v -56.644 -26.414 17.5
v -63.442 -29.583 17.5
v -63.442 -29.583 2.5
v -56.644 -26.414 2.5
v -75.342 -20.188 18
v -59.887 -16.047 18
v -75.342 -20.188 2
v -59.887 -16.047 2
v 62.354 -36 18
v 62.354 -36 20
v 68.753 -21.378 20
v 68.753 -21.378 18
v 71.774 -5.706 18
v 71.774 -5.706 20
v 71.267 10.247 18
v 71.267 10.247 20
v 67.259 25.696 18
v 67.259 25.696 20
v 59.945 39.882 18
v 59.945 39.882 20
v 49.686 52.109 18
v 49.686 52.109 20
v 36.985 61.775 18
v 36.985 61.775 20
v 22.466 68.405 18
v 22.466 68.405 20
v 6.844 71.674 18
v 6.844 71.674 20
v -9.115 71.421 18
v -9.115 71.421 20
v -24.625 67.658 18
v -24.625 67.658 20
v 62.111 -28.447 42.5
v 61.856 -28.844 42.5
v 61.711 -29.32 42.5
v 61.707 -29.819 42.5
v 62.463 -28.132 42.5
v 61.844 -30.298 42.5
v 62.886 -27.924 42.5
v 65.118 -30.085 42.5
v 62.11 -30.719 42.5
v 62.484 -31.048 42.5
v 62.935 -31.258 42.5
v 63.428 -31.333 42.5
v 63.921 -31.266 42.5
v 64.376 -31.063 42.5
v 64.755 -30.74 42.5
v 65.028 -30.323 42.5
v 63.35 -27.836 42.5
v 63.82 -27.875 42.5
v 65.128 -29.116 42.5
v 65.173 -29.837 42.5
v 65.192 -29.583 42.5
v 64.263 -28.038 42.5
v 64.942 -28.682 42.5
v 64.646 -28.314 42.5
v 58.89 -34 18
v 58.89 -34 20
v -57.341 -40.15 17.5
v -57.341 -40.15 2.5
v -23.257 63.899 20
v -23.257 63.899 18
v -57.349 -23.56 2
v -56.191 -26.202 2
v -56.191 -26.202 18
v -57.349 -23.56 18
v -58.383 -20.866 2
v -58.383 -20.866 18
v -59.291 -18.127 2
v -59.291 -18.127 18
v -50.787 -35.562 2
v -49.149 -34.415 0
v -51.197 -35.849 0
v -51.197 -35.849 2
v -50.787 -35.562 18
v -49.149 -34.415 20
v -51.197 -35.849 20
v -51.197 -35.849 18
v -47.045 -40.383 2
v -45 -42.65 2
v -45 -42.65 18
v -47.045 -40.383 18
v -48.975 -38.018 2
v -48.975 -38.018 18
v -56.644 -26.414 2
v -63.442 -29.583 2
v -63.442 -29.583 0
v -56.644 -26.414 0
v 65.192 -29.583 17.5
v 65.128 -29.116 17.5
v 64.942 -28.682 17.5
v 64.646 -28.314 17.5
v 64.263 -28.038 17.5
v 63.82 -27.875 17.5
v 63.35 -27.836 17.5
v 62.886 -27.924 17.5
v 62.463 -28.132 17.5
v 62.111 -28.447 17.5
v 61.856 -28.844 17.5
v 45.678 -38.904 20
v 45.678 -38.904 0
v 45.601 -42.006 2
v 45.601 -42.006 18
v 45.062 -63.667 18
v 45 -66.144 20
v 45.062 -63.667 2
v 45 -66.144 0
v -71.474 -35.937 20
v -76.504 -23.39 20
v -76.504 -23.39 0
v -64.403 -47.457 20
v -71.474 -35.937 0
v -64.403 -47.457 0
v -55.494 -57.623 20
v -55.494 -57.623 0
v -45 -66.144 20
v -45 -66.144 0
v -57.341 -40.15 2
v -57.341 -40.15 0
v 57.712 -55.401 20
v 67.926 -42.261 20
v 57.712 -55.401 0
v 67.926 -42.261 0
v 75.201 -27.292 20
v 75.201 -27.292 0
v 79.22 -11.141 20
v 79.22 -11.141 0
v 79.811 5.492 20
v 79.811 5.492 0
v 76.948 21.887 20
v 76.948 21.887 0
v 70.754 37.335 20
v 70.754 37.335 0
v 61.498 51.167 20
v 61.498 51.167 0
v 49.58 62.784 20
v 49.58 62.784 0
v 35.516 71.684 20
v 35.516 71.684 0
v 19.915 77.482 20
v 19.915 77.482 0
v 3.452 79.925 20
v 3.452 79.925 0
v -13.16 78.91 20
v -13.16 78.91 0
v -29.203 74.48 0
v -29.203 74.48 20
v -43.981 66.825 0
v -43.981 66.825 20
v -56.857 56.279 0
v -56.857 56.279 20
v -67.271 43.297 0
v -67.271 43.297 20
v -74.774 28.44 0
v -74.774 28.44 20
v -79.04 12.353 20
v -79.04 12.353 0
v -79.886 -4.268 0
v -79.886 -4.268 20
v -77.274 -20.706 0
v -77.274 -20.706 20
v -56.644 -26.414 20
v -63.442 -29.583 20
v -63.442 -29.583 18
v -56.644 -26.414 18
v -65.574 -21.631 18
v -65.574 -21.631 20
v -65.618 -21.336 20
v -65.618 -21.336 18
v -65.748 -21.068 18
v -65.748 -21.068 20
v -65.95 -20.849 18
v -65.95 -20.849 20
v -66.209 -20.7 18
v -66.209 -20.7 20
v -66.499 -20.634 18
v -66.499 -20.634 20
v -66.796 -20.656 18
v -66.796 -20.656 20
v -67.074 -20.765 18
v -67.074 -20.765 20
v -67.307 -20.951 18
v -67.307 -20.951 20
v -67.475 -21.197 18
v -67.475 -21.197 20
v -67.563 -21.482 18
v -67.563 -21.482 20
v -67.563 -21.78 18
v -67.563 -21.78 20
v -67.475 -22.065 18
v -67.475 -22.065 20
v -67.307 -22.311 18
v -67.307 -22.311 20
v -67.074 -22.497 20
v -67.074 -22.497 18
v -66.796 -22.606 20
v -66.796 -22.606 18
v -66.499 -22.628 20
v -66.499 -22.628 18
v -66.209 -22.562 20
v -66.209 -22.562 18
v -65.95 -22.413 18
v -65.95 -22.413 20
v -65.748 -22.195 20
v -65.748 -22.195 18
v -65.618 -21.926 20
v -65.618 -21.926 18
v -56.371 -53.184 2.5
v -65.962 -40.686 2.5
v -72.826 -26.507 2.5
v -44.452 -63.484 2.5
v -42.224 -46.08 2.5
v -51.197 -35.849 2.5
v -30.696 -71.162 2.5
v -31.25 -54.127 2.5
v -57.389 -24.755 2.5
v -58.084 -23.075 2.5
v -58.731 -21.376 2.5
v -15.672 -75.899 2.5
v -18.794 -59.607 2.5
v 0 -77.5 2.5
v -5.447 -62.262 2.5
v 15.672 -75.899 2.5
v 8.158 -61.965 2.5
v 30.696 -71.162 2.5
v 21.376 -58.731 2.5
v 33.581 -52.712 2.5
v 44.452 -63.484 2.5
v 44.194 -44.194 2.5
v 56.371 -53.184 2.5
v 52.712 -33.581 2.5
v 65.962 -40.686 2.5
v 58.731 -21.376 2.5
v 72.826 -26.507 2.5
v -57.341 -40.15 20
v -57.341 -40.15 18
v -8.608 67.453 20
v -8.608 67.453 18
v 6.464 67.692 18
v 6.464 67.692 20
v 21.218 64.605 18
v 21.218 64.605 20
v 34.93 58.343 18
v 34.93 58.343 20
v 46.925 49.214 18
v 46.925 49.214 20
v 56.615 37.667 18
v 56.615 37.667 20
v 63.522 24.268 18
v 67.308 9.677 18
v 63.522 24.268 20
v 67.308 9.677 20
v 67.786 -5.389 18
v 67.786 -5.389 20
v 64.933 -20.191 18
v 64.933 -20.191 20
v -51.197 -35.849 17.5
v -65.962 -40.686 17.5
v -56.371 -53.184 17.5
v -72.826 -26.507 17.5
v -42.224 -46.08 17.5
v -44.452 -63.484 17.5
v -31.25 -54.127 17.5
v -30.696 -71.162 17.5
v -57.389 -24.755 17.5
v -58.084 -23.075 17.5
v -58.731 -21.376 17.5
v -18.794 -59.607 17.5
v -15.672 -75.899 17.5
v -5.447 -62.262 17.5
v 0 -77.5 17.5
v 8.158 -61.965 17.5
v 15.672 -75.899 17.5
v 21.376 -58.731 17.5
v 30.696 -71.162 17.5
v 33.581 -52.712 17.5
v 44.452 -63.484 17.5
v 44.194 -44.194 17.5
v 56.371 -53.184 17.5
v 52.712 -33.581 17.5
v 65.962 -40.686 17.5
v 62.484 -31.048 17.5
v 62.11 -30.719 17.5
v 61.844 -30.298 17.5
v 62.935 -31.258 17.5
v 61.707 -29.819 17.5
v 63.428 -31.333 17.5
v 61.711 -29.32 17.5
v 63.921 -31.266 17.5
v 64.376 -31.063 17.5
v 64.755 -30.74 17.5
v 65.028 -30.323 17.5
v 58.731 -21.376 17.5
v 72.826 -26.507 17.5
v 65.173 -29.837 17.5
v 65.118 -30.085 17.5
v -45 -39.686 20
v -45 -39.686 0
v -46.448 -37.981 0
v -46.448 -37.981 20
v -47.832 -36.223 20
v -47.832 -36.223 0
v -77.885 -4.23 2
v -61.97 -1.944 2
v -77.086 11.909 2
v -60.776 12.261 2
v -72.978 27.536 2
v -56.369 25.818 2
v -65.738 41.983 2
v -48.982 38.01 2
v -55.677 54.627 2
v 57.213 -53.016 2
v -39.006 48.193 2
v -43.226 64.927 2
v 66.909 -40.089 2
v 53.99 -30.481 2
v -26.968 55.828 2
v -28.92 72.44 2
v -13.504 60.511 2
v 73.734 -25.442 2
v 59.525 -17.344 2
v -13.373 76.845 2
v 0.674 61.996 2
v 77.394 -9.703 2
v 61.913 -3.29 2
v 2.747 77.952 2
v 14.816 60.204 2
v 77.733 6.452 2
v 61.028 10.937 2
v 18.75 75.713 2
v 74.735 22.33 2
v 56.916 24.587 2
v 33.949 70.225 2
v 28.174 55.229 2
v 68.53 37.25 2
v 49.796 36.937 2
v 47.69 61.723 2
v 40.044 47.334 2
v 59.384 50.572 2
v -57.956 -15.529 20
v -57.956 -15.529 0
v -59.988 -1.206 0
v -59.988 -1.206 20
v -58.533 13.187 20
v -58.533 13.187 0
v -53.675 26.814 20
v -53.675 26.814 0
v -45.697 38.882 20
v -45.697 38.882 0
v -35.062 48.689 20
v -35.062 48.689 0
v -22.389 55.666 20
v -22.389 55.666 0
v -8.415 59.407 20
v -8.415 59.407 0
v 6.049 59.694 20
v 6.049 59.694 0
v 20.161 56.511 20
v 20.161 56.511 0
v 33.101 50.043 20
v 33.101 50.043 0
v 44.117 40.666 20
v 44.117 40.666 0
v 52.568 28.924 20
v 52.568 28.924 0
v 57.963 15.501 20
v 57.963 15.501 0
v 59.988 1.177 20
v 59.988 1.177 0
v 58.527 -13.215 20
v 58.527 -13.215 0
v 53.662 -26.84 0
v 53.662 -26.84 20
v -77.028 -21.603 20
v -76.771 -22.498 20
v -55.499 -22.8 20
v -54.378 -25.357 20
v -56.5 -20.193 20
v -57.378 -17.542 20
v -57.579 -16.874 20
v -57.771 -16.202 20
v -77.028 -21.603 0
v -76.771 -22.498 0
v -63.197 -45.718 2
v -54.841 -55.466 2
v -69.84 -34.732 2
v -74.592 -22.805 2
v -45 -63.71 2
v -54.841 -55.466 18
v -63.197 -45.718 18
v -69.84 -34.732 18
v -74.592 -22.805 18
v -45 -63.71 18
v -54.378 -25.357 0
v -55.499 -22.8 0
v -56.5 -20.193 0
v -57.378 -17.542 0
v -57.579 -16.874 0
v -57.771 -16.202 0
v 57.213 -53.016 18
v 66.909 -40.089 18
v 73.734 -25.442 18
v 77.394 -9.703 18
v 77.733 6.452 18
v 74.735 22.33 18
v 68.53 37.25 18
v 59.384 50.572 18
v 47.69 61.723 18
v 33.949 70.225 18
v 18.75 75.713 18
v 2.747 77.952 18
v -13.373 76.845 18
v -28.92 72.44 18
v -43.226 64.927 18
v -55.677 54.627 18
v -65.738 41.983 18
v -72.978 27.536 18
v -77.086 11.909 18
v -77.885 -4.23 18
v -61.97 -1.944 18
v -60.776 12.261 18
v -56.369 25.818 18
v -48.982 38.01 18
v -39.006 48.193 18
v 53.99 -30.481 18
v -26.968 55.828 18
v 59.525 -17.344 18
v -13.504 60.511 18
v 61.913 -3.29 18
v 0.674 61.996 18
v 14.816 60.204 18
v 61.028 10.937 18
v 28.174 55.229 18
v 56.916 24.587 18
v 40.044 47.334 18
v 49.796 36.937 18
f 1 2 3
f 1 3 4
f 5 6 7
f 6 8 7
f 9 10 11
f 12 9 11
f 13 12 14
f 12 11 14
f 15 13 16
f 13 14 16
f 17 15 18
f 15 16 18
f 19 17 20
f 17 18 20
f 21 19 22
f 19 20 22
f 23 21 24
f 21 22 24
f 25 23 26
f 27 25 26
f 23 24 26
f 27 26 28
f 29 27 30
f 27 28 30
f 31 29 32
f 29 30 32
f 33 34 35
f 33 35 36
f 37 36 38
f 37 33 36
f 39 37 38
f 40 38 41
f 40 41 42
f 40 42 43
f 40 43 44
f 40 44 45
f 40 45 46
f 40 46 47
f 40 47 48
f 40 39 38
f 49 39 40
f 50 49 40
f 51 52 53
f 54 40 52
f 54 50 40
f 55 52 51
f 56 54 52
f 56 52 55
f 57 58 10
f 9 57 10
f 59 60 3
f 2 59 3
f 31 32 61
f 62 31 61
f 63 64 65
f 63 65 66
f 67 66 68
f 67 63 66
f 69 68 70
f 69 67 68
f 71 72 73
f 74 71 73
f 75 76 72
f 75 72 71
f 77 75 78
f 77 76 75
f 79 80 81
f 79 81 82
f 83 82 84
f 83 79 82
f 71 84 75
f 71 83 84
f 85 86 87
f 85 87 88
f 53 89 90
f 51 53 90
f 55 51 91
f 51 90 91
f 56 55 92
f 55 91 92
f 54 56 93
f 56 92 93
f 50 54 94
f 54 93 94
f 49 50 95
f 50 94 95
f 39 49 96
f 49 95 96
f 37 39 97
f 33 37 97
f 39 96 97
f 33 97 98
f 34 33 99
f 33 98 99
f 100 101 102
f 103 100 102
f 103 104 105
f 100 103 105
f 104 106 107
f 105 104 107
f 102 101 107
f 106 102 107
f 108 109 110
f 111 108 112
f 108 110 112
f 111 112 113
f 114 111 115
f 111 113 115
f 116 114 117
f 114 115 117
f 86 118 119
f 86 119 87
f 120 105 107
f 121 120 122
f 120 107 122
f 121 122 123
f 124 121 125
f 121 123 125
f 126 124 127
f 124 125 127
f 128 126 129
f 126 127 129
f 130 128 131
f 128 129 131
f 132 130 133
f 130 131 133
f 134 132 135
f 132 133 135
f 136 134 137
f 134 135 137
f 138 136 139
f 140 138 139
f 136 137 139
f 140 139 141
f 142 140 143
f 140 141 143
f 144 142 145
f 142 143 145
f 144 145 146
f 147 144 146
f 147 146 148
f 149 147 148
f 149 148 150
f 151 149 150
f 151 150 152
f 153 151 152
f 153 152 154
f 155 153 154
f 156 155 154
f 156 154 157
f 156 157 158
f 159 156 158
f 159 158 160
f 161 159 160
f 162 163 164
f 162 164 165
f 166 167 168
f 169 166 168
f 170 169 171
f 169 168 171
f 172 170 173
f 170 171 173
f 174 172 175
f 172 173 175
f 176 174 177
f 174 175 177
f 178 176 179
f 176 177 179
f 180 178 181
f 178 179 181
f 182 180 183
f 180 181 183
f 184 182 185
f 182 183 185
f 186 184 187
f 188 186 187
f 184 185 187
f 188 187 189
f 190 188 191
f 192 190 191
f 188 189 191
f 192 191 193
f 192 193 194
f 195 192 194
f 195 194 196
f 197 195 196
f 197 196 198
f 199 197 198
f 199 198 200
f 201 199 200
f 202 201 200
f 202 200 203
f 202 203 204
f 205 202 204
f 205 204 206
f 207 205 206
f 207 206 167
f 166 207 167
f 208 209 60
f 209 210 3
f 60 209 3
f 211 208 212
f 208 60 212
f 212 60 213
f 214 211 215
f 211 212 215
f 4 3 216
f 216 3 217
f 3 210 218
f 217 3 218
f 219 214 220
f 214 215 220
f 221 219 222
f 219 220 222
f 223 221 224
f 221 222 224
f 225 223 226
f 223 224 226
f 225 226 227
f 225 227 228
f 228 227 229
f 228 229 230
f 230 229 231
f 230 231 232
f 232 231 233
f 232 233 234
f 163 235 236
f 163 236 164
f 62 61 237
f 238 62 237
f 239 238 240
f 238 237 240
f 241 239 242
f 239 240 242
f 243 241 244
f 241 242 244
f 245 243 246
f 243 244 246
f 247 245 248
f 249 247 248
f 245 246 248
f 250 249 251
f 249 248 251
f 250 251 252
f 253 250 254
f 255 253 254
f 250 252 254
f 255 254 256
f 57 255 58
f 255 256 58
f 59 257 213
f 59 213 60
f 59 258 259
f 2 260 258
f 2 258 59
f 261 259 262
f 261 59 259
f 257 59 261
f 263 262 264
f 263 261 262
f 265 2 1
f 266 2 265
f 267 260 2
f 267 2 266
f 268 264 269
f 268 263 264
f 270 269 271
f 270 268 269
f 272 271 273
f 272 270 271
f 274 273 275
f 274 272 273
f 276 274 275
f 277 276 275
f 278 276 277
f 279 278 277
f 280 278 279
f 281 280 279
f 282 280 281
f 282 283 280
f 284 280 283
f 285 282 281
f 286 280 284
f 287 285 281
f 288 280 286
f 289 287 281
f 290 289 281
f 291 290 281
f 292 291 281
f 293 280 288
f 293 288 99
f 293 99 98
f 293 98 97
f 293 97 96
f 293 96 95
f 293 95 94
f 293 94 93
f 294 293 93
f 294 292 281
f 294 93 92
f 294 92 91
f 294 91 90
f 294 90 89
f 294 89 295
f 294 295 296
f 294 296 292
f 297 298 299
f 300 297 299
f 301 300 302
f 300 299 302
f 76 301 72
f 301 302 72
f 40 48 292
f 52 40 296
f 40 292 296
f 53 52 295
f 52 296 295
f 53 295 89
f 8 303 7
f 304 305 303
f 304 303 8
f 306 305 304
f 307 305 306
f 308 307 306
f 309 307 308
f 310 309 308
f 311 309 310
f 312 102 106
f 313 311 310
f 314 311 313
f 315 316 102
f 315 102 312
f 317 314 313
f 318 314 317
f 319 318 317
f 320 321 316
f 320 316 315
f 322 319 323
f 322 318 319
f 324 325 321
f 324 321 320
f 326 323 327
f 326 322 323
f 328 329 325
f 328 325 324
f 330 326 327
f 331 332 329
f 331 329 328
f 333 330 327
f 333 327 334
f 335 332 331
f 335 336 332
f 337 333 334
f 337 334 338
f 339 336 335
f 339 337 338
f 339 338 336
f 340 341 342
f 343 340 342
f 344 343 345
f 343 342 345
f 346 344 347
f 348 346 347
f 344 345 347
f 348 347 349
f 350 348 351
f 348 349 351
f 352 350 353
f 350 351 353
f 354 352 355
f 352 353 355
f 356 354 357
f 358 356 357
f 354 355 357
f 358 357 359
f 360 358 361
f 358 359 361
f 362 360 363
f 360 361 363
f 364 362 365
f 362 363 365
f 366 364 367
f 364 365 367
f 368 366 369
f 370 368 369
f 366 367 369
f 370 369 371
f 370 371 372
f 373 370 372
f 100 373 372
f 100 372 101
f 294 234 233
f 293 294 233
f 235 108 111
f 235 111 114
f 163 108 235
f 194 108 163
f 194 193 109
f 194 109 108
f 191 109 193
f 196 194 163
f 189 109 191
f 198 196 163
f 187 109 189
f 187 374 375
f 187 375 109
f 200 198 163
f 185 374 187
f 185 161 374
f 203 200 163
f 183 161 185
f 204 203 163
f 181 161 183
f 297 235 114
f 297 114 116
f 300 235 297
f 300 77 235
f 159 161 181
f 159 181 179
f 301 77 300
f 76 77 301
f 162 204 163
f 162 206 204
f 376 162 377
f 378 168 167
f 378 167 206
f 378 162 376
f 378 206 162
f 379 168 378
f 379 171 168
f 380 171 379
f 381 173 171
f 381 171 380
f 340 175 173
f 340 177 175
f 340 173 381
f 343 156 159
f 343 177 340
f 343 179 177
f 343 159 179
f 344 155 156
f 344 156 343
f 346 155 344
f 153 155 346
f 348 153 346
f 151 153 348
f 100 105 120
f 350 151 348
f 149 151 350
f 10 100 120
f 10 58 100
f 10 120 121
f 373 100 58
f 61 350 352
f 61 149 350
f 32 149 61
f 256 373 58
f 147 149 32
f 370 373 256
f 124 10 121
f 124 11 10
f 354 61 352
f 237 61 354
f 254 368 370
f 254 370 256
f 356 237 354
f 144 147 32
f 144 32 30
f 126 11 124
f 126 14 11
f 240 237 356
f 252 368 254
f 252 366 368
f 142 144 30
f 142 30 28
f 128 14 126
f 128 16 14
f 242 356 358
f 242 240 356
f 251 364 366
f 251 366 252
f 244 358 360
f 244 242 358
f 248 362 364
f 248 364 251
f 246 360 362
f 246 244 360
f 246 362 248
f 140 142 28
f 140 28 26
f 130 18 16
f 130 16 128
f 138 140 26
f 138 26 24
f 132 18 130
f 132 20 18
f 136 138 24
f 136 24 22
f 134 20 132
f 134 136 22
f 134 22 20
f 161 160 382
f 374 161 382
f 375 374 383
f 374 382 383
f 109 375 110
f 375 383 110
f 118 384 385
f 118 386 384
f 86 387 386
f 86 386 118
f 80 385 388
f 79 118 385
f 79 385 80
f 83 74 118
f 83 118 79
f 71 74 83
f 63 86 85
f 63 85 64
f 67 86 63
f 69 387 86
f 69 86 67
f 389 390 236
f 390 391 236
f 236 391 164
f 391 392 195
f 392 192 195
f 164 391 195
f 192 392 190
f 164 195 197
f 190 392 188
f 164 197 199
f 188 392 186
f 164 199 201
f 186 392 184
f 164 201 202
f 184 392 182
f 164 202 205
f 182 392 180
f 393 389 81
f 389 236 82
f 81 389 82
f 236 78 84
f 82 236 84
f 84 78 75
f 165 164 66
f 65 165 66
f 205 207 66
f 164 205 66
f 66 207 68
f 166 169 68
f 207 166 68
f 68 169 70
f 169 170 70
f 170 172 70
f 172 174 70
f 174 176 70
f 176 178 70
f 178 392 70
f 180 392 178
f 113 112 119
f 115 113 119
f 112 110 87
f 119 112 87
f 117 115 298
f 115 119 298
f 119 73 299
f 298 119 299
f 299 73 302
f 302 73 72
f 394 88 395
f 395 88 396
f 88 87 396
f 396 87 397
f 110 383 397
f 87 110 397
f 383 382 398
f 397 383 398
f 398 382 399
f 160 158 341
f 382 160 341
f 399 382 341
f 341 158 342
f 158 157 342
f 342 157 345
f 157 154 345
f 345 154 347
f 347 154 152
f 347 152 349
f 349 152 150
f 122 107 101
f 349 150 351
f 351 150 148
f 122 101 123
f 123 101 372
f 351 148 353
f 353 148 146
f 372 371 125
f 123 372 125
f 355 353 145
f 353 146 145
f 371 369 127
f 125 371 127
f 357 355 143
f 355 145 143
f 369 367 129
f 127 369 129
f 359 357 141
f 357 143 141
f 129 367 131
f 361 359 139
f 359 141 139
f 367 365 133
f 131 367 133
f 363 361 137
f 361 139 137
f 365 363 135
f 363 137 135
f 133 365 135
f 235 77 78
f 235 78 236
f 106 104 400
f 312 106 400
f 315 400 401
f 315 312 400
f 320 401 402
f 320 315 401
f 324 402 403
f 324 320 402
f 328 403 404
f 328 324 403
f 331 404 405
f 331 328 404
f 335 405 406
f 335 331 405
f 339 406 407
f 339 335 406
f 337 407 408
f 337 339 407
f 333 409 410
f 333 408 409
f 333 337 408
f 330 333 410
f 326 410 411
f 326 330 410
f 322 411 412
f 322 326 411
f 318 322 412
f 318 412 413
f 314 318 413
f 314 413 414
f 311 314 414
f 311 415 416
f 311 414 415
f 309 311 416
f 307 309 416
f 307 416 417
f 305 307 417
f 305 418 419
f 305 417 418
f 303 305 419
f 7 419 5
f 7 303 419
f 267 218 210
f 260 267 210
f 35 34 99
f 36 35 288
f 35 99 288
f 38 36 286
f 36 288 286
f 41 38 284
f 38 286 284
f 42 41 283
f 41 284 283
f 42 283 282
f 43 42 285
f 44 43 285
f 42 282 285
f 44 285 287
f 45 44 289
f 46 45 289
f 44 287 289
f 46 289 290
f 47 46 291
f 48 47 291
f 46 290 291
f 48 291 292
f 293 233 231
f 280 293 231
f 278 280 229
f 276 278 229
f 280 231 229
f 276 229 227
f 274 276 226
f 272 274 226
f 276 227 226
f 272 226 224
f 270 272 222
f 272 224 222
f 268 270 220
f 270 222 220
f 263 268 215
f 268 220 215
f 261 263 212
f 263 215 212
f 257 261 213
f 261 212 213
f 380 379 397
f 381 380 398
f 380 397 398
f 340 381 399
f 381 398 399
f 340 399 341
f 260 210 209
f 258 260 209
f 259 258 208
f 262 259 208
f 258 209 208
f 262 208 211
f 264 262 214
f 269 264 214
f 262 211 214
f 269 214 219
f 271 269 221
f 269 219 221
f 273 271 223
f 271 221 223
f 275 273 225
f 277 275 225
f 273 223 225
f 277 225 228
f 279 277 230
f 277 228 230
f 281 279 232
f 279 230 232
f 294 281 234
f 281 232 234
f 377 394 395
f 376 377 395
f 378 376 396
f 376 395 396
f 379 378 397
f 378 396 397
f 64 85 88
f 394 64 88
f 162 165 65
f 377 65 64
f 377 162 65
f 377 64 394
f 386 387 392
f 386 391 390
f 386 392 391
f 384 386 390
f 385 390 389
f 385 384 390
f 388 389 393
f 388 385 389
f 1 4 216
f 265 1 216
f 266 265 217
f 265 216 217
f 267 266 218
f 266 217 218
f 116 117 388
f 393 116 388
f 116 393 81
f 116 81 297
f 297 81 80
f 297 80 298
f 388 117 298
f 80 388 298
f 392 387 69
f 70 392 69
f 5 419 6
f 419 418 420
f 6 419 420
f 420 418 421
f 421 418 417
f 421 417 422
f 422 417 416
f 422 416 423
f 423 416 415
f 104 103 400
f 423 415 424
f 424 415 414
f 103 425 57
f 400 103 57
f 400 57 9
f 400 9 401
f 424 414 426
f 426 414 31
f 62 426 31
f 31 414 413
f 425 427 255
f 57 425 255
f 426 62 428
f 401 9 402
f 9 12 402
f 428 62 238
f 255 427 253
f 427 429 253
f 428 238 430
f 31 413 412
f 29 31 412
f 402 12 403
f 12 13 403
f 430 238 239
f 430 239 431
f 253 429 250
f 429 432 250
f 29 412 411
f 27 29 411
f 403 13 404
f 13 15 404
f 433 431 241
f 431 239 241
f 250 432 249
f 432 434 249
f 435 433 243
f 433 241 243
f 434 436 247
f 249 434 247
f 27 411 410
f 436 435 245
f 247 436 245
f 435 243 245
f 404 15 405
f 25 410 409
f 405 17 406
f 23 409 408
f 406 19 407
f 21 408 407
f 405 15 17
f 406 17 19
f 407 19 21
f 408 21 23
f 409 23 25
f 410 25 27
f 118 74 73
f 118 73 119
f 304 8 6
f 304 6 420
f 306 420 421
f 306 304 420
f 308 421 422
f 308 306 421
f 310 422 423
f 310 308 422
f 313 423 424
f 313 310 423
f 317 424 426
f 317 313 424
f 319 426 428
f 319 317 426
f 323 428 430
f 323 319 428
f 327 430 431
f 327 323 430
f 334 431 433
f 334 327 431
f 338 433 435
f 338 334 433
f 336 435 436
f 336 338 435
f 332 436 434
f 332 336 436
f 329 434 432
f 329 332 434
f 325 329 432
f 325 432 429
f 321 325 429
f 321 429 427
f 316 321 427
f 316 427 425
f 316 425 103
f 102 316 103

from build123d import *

# Parameters (mm, degrees)
BOSS_EXTRUDE7_DEPTH  = 20
SHELL3_T             = -2
CUT_EXTRUDE4_DEPTH   = 2
SKETCH17_R           = 1
CUT_EXTRUDE5_DEPTH   = 3
BOSS_EXTRUDE11_START = -20
BOSS_EXTRUDE11_DEPTH = 20
BOSS_EXTRUDE12_START = 2.5
BOSS_EXTRUDE12_DEPTH = 15
CUT_EXTRUDE6_START   = -20
CUT_EXTRUDE6_DEPTH   = 20
BOSS_EXTRUDE14_START = 2.5
BOSS_EXTRUDE14_DEPTH = 40


# Read off the part's stored shape, not the designer's step: Cut-Extrude6
with BuildPart() as part:
    # Sketch12 → Boss-Extrude7 (new body)
    with BuildSketch(Plane.XY):
        with BuildLine():
            Line((-45, -66.143782777), (-45, -39.686269666))
            ThreePointArc((-45, -39.686269666), (-0.517840004, 59.997765306), (45.678308464, -38.903626256))
            Line((45.678308464, -38.903626256), (45, -66.143782777))
            ThreePointArc((45, -66.143782777), (0, 80), (-45, -66.143782777))
        make_face()
    extrude(amount=BOSS_EXTRUDE7_DEPTH)

    # Shell3
    shell3_openings = [part.faces().sort_by_distance(p)[0] for p in [
        (45.339154232, -52.523704516, 10),
        (-45, -52.915026221, 10),
    ]]
    offset(amount=SHELL3_T, openings=shell3_openings, kind=Kind.INTERSECTION)

    # Sketch15 → Cut-Extrude4 (cut)
    with BuildSketch(Plane.XY.offset(20)):
        with BuildLine():
            Line((58.889727457, -34), (62.353829072, -36))
            ThreePointArc((62.353829072, -36), (55.155199905, 46.280707897), (-24.625450319, 67.657868697))
            Line((-24.625450319, 67.657868697), (-23.257369746, 63.899098213))
            ThreePointArc((-23.257369746, 63.899098213), (52.091022132, 43.709557459), (58.889727457, -34))
        make_face()
    extrude(amount=-CUT_EXTRUDE4_DEPTH, mode=Mode.SUBTRACT)

    # Sketch17 → Cut-Extrude5 (cut)
    with BuildSketch(Plane.XY.offset(20)):
        with Locations((-66.573956141, -21.631189606)):
            Circle(SKETCH17_R)
    extrude(amount=-CUT_EXTRUDE5_DEPTH, mode=Mode.SUBTRACT)

    # Sketch17<4> → Boss-Extrude11 (add)
    with BuildSketch(Plane.XY.offset(20).offset(BOSS_EXTRUDE11_START)):
        with BuildLine():
            Line((-76.504380477, -23.389736378), (-57.378285358, -17.542302283))
            ThreePointArc((-57.378285358, -17.542302283), (-57.675701756, -16.538241349), (-57.955549577, -15.529142706))
            Line((-57.955549577, -15.529142706), (-77.274066103, -20.705523608))
            ThreePointArc((-77.274066103, -20.705523608), (-76.900935675, -22.050988465), (-76.504380477, -23.389736378))
        make_face()
    extrude(amount=BOSS_EXTRUDE11_DEPTH)


with BuildPart() as body_2:
    # Sketch19 → Boss-Extrude12 (new body)
    with BuildSketch(Plane.XY.offset(BOSS_EXTRUDE12_START)):
        with BuildLine():
            Line((-58.730788799, -21.376258958), (-72.826178111, -26.506561108))
            ThreePointArc((-72.826178111, -26.506561108), (0, -77.5), (72.826178111, -26.506561108))
            Line((72.826178111, -26.506561108), (58.730788799, -21.376258958))
            ThreePointArc((58.730788799, -21.376258958), (0, -62.5), (-58.730788799, -21.376258958))
        make_face()
    extrude(amount=BOSS_EXTRUDE12_DEPTH)


with BuildPart() as cut_extrude6_tool:
    # Cut-Extrude6 outline → Cut-Extrude6 (new body)
    with BuildSketch(Plane(origin=(0, 0, 0), x_dir=(-1, 0, 0), z_dir=(0, 0, -1)).offset(CUT_EXTRUDE6_START)):
        with BuildLine():
            Line((51.197002768, -35.848527272), (57.3406431, -40.150350545))
            Line((57.3406431, -40.150350545), (63.441545093, -29.583278322))
            Line((63.441545093, -29.583278322), (56.64423669, -26.413641359))
            Line((56.64423669, -26.413641359), (54.378467222, -25.357095704))
            ThreePointArc((54.378467222, -25.357095704), (51.961524227, -30), (49.149122657, -34.414586181))
            Line((49.149122657, -34.414586181), (51.197002768, -35.848527272))
        make_face()
    extrude(amount=CUT_EXTRUDE6_DEPTH)


with BuildPart() as part_1:
    add(part.part)

    # Cut-Extrude6: cut by cut_extrude6_tool
    add(cut_extrude6_tool.part, mode=Mode.SUBTRACT)


with BuildPart() as body_2_1:
    add(body_2.part)

    # Cut-Extrude6: cut by cut_extrude6_tool
    add(cut_extrude6_tool.part, mode=Mode.SUBTRACT)

    # Sketch19<5> → Boss-Extrude14 (add)
    with BuildSketch(Plane.XY.offset(BOSS_EXTRUDE14_START)):
        with BuildLine():
            ThreePointArc((65.191545093, -29.583278322), (63.820314417, -27.874760309), (61.855506465, -28.843696364))
            Line((61.855506465, -28.843696364), (65.02758372, -30.32286028))
            ThreePointArc((65.02758372, -30.32286028), (65.150063105, -29.962047646), (65.191545093, -29.583278322))
        make_face()
        with BuildLine():
            Line((65.02758372, -30.32286028), (61.855506465, -28.843696364))
            ThreePointArc((61.855506465, -28.843696364), (62.701963135, -31.169316949), (65.02758372, -30.32286028))
        make_face()
    extrude(amount=BOSS_EXTRUDE14_DEPTH)


solid = Compound([part_1.part, body_2_1.part])
